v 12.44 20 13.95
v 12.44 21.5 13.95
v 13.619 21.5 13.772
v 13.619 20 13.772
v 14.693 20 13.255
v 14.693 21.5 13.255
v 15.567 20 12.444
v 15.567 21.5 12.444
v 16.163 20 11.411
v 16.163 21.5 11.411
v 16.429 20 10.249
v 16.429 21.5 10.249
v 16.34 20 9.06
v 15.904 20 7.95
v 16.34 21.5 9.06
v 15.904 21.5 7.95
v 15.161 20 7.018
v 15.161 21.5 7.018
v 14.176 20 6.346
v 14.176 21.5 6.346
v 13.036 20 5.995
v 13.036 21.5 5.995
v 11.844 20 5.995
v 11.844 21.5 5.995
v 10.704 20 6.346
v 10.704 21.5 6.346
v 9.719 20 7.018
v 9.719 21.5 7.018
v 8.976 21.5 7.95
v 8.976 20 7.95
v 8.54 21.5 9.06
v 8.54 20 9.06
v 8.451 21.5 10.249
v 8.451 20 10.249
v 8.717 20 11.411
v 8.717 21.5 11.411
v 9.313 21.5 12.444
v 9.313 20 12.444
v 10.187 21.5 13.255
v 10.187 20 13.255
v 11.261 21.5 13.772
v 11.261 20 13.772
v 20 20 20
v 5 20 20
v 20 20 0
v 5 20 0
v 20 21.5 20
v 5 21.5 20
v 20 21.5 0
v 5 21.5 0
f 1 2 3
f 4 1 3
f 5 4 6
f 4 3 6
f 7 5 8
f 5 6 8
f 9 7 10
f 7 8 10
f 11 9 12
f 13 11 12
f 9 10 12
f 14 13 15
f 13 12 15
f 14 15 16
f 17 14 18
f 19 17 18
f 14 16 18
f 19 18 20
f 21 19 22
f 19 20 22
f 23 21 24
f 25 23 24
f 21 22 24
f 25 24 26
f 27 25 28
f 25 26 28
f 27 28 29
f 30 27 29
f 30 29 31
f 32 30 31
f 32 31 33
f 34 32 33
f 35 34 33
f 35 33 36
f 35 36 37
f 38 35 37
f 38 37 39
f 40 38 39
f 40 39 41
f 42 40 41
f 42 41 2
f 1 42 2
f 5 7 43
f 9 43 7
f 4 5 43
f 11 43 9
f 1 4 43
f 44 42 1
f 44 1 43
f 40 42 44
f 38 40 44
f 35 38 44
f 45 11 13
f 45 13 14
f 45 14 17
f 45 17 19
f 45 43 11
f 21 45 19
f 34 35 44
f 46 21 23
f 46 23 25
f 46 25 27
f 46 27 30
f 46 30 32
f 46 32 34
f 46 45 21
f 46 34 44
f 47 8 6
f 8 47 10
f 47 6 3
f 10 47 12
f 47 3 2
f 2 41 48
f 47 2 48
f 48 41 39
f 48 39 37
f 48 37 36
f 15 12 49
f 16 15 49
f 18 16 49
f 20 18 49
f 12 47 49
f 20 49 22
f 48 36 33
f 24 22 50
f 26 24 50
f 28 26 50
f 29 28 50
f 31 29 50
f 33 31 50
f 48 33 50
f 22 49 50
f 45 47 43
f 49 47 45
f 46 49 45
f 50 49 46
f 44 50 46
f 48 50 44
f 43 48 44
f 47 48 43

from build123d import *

# Parameters (mm, degrees)
BOSS_EXTRUDE1_DEPTH = 20
BOSS_EXTRUDE2_DEPTH = 1.5
SKETCH3_W           = 10
SKETCH3_H           = 2
BOSS_EXTRUDE3_DEPTH = 100
SKETCH4_R           = 1.55
CUT_EXTRUDE1_DEPTH  = 2
SKETCH5_R           = 4
CUT_EXTRUDE2_DEPTH  = 3
CUT_EXTRUDE3_START  = -2
CUT_EXTRUDE3_DEPTH  = 2
SKETCH7_W           = 92.843167551
SKETCH7_H           = 36.119357845
CUT_EXTRUDE4_DEPTH  = 30
SKETCH8_W           = 90.626752411
SKETCH8_H           = 35.380552798
CUT_EXTRUDE5_DEPTH  = 55
SKETCH10_W          = 29.390209747
SKETCH10_H          = 30.061690813
CUT_EXTRUDE7_DEPTH  = 20
SKETCH11_W          = 23.008025921
SKETCH11_H          = 26.899718038
CUT_EXTRUDE8_DEPTH  = 40


# Read off the part's stored shape, not the designer's step: Boss-Extrude1, Cut-Extrude3
with BuildPart() as part:
    # Boss-Extrude1 outline → Boss-Extrude1 (new body)
    with BuildSketch(Plane(origin=(0, 0, 0), x_dir=(1, 0, 0), z_dir=(0, 1, 0))):
        with BuildLine():
            Line((49.999999852, 30), (4.999999852, 30))
            ThreePointArc((4.999999852, 30), (1.464465946, 31.464466094), (-1.48e-07, 35))
            Line((-1.48e-07, 35), (-1.48e-07, 40))
            Line((-1.48e-07, 40), (-40.000000148, 40))
            Line((-40.000000148, 40), (-40.000000111, 35))
            ThreePointArc((-40.000000111, 35), (-41.464466194, 31.46446612), (-45.000000074, 30.000000037))
            Line((-45.000000074, 30.000000037), (-50.000000148, 30))
            Line((-50.000000148, 30), (-50.000000148, -30))
            Line((-50.000000148, -30), (49.999999852, -30))
            Line((49.999999852, -30), (49.999999852, 30))
        make_face()
        with BuildLine():
            Line((-48.5, 28.5), (-44.999018222, 28.5))
            ThreePointArc((-44.999018222, 28.5), (-40.40345882, 30.40415302), (-38.5, 35))
            Line((-38.5, 35), (-38.5, 38.5))
            Line((-38.5, 38.5), (-1.500000148, 38.5))
            Line((-1.500000148, 38.5), (-1.500000148, 35))
            ThreePointArc((-1.500000148, 35), (0.403805774, 30.403805922), (4.999999852, 28.5))
            Line((4.999999852, 28.5), (48.5, 28.5))
            Line((48.5, 28.5), (48.5, -28.5))
            Line((48.5, -28.5), (-48.5, -28.5))
            Line((-48.5, -28.5), (-48.5, 28.5))
        make_face(mode=Mode.SUBTRACT)
    extrude(amount=BOSS_EXTRUDE1_DEPTH)

    # Sketch2 → Boss-Extrude2 (add)
    with BuildSketch(Plane(origin=(0, 20, 0), x_dir=(1, 0, 0), z_dir=(0, 1, 0))):
        with BuildLine():
            Line((-40.000000148, 40), (-1.48e-07, 40))
            Line((-1.48e-07, 40), (-1.48e-07, 35))
            ThreePointArc((-1.48e-07, 35), (1.464465946, 31.464466094), (4.999999852, 30))
            Line((4.999999852, 30), (49.999999852, 30))
            Line((49.999999852, 30), (49.999999852, -30))
            Line((49.999999852, -30), (-50.000000148, -30))
            Line((-50.000000148, -30), (-50.000000148, 30))
            Line((-50.000000148, 30), (-45.000000074, 30))
            ThreePointArc((-45.000000074, 30), (-41.464466216, 31.46446612), (-40.000000148, 35))
            Line((-40.000000148, 35), (-40.000000148, 40))
        make_face()
    extrude(amount=BOSS_EXTRUDE2_DEPTH)

    # Sketch3 → Boss-Extrude3 (add)
    with BuildSketch(Plane(origin=(49.999999852, 0, 0), x_dir=(0, 0, -1), z_dir=(1, 0, 0))):
        with Locations((35, 1)):
            Rectangle(SKETCH3_W, SKETCH3_H)
        with Locations((-35, 1)):
            Rectangle(SKETCH3_W, SKETCH3_H)
    extrude(amount=-BOSS_EXTRUDE3_DEPTH)

    # Sketch4 → Cut-Extrude1 (cut)
    with BuildSketch(Plane.XZ):
        with Locations(Location((-45, 35, 0), (0, 0, 270))):
            Circle(SKETCH4_R)
        with Locations(Location((45, 35, 0), (0, 0, 270))):
            Circle(SKETCH4_R)
        with Locations(Location((45, -35, 0), (0, 0, 270))):
            Circle(SKETCH4_R)
        with Locations(Location((-45, -35, 0), (0, 0, 270))):
            Circle(SKETCH4_R)
        with Locations(Location((5, 35, 0), (0, 0, 270))):
            Circle(SKETCH4_R)
        with Locations(Location((5, -35, 0), (0, 0, 270))):
            Circle(SKETCH4_R)
    extrude(amount=-CUT_EXTRUDE1_DEPTH, mode=Mode.SUBTRACT)

    # Sketch5 → Cut-Extrude2 (cut)
    with BuildSketch(Plane(origin=(0, 21.5, 0), x_dir=(1, 0, 0), z_dir=(0, 1, 0))):
        with Locations(Location((12.44, -9.95, 0), (0, 0, 270))):
            Circle(SKETCH5_R)
    extrude(amount=-CUT_EXTRUDE2_DEPTH, mode=Mode.SUBTRACT)

    # Cut-Extrude3 outline → Cut-Extrude3 (cut)
    with BuildSketch(Plane(origin=(0, 2, 0), x_dir=(1, 0, 0), z_dir=(0, 1, 0)).offset(CUT_EXTRUDE3_START)):
        with BuildLine():
            Line((-38.5, 38.5), (-38.5, 35))
            ThreePointArc((-38.5, 35), (-39.115846372, 32.238345392), (-40.846688027, 30))
            Line((-40.846688027, 30), (0.84668792, 30))
            ThreePointArc((0.84668792, 30), (-0.884153764, 32.238345383), (-1.500000148, 35))
            Line((-1.500000148, 35), (-1.500000148, 38.5))
            Line((-1.500000148, 38.5), (-38.5, 38.5))
        make_face()
    extrude(amount=CUT_EXTRUDE3_DEPTH, mode=Mode.SUBTRACT)

    # Sketch7 → Cut-Extrude4 (cut)
    with BuildSketch(Plane(origin=(49.999999852, 0, 0), x_dir=(0, 0, -1), z_dir=(1, 0, 0))):
        with Locations((0.287313074, 10.115071794)):
            Rectangle(SKETCH7_W, SKETCH7_H)
    extrude(amount=-CUT_EXTRUDE4_DEPTH, mode=Mode.SUBTRACT)

    # Sketch8 → Cut-Extrude5 (cut)
    with BuildSketch(Plane.ZY.offset(50.000000148)):
        with Locations((-1.067162845, 10.564009403)):
            Rectangle(SKETCH8_W, SKETCH8_H)
    extrude(amount=-CUT_EXTRUDE5_DEPTH, mode=Mode.SUBTRACT)

    # Sketch10 → Cut-Extrude7 (cut)
    with BuildSketch(Plane.XY.offset(40)):
        with Locations((11.70310279, 9.975782262)):
            Rectangle(SKETCH10_W, SKETCH10_H)
    extrude(amount=-CUT_EXTRUDE7_DEPTH, mode=Mode.SUBTRACT)

    # Sketch11 → Cut-Extrude8 (cut)
    with BuildSketch(Plane(origin=(0, 0, -40), x_dir=(-1, 0, 0), z_dir=(0, 0, -1))):
        with Locations((-13.617747202, 10.15531134)):
            Rectangle(SKETCH11_W, SKETCH11_H)
    extrude(amount=-CUT_EXTRUDE8_DEPTH, mode=Mode.SUBTRACT)


solid = part.part
